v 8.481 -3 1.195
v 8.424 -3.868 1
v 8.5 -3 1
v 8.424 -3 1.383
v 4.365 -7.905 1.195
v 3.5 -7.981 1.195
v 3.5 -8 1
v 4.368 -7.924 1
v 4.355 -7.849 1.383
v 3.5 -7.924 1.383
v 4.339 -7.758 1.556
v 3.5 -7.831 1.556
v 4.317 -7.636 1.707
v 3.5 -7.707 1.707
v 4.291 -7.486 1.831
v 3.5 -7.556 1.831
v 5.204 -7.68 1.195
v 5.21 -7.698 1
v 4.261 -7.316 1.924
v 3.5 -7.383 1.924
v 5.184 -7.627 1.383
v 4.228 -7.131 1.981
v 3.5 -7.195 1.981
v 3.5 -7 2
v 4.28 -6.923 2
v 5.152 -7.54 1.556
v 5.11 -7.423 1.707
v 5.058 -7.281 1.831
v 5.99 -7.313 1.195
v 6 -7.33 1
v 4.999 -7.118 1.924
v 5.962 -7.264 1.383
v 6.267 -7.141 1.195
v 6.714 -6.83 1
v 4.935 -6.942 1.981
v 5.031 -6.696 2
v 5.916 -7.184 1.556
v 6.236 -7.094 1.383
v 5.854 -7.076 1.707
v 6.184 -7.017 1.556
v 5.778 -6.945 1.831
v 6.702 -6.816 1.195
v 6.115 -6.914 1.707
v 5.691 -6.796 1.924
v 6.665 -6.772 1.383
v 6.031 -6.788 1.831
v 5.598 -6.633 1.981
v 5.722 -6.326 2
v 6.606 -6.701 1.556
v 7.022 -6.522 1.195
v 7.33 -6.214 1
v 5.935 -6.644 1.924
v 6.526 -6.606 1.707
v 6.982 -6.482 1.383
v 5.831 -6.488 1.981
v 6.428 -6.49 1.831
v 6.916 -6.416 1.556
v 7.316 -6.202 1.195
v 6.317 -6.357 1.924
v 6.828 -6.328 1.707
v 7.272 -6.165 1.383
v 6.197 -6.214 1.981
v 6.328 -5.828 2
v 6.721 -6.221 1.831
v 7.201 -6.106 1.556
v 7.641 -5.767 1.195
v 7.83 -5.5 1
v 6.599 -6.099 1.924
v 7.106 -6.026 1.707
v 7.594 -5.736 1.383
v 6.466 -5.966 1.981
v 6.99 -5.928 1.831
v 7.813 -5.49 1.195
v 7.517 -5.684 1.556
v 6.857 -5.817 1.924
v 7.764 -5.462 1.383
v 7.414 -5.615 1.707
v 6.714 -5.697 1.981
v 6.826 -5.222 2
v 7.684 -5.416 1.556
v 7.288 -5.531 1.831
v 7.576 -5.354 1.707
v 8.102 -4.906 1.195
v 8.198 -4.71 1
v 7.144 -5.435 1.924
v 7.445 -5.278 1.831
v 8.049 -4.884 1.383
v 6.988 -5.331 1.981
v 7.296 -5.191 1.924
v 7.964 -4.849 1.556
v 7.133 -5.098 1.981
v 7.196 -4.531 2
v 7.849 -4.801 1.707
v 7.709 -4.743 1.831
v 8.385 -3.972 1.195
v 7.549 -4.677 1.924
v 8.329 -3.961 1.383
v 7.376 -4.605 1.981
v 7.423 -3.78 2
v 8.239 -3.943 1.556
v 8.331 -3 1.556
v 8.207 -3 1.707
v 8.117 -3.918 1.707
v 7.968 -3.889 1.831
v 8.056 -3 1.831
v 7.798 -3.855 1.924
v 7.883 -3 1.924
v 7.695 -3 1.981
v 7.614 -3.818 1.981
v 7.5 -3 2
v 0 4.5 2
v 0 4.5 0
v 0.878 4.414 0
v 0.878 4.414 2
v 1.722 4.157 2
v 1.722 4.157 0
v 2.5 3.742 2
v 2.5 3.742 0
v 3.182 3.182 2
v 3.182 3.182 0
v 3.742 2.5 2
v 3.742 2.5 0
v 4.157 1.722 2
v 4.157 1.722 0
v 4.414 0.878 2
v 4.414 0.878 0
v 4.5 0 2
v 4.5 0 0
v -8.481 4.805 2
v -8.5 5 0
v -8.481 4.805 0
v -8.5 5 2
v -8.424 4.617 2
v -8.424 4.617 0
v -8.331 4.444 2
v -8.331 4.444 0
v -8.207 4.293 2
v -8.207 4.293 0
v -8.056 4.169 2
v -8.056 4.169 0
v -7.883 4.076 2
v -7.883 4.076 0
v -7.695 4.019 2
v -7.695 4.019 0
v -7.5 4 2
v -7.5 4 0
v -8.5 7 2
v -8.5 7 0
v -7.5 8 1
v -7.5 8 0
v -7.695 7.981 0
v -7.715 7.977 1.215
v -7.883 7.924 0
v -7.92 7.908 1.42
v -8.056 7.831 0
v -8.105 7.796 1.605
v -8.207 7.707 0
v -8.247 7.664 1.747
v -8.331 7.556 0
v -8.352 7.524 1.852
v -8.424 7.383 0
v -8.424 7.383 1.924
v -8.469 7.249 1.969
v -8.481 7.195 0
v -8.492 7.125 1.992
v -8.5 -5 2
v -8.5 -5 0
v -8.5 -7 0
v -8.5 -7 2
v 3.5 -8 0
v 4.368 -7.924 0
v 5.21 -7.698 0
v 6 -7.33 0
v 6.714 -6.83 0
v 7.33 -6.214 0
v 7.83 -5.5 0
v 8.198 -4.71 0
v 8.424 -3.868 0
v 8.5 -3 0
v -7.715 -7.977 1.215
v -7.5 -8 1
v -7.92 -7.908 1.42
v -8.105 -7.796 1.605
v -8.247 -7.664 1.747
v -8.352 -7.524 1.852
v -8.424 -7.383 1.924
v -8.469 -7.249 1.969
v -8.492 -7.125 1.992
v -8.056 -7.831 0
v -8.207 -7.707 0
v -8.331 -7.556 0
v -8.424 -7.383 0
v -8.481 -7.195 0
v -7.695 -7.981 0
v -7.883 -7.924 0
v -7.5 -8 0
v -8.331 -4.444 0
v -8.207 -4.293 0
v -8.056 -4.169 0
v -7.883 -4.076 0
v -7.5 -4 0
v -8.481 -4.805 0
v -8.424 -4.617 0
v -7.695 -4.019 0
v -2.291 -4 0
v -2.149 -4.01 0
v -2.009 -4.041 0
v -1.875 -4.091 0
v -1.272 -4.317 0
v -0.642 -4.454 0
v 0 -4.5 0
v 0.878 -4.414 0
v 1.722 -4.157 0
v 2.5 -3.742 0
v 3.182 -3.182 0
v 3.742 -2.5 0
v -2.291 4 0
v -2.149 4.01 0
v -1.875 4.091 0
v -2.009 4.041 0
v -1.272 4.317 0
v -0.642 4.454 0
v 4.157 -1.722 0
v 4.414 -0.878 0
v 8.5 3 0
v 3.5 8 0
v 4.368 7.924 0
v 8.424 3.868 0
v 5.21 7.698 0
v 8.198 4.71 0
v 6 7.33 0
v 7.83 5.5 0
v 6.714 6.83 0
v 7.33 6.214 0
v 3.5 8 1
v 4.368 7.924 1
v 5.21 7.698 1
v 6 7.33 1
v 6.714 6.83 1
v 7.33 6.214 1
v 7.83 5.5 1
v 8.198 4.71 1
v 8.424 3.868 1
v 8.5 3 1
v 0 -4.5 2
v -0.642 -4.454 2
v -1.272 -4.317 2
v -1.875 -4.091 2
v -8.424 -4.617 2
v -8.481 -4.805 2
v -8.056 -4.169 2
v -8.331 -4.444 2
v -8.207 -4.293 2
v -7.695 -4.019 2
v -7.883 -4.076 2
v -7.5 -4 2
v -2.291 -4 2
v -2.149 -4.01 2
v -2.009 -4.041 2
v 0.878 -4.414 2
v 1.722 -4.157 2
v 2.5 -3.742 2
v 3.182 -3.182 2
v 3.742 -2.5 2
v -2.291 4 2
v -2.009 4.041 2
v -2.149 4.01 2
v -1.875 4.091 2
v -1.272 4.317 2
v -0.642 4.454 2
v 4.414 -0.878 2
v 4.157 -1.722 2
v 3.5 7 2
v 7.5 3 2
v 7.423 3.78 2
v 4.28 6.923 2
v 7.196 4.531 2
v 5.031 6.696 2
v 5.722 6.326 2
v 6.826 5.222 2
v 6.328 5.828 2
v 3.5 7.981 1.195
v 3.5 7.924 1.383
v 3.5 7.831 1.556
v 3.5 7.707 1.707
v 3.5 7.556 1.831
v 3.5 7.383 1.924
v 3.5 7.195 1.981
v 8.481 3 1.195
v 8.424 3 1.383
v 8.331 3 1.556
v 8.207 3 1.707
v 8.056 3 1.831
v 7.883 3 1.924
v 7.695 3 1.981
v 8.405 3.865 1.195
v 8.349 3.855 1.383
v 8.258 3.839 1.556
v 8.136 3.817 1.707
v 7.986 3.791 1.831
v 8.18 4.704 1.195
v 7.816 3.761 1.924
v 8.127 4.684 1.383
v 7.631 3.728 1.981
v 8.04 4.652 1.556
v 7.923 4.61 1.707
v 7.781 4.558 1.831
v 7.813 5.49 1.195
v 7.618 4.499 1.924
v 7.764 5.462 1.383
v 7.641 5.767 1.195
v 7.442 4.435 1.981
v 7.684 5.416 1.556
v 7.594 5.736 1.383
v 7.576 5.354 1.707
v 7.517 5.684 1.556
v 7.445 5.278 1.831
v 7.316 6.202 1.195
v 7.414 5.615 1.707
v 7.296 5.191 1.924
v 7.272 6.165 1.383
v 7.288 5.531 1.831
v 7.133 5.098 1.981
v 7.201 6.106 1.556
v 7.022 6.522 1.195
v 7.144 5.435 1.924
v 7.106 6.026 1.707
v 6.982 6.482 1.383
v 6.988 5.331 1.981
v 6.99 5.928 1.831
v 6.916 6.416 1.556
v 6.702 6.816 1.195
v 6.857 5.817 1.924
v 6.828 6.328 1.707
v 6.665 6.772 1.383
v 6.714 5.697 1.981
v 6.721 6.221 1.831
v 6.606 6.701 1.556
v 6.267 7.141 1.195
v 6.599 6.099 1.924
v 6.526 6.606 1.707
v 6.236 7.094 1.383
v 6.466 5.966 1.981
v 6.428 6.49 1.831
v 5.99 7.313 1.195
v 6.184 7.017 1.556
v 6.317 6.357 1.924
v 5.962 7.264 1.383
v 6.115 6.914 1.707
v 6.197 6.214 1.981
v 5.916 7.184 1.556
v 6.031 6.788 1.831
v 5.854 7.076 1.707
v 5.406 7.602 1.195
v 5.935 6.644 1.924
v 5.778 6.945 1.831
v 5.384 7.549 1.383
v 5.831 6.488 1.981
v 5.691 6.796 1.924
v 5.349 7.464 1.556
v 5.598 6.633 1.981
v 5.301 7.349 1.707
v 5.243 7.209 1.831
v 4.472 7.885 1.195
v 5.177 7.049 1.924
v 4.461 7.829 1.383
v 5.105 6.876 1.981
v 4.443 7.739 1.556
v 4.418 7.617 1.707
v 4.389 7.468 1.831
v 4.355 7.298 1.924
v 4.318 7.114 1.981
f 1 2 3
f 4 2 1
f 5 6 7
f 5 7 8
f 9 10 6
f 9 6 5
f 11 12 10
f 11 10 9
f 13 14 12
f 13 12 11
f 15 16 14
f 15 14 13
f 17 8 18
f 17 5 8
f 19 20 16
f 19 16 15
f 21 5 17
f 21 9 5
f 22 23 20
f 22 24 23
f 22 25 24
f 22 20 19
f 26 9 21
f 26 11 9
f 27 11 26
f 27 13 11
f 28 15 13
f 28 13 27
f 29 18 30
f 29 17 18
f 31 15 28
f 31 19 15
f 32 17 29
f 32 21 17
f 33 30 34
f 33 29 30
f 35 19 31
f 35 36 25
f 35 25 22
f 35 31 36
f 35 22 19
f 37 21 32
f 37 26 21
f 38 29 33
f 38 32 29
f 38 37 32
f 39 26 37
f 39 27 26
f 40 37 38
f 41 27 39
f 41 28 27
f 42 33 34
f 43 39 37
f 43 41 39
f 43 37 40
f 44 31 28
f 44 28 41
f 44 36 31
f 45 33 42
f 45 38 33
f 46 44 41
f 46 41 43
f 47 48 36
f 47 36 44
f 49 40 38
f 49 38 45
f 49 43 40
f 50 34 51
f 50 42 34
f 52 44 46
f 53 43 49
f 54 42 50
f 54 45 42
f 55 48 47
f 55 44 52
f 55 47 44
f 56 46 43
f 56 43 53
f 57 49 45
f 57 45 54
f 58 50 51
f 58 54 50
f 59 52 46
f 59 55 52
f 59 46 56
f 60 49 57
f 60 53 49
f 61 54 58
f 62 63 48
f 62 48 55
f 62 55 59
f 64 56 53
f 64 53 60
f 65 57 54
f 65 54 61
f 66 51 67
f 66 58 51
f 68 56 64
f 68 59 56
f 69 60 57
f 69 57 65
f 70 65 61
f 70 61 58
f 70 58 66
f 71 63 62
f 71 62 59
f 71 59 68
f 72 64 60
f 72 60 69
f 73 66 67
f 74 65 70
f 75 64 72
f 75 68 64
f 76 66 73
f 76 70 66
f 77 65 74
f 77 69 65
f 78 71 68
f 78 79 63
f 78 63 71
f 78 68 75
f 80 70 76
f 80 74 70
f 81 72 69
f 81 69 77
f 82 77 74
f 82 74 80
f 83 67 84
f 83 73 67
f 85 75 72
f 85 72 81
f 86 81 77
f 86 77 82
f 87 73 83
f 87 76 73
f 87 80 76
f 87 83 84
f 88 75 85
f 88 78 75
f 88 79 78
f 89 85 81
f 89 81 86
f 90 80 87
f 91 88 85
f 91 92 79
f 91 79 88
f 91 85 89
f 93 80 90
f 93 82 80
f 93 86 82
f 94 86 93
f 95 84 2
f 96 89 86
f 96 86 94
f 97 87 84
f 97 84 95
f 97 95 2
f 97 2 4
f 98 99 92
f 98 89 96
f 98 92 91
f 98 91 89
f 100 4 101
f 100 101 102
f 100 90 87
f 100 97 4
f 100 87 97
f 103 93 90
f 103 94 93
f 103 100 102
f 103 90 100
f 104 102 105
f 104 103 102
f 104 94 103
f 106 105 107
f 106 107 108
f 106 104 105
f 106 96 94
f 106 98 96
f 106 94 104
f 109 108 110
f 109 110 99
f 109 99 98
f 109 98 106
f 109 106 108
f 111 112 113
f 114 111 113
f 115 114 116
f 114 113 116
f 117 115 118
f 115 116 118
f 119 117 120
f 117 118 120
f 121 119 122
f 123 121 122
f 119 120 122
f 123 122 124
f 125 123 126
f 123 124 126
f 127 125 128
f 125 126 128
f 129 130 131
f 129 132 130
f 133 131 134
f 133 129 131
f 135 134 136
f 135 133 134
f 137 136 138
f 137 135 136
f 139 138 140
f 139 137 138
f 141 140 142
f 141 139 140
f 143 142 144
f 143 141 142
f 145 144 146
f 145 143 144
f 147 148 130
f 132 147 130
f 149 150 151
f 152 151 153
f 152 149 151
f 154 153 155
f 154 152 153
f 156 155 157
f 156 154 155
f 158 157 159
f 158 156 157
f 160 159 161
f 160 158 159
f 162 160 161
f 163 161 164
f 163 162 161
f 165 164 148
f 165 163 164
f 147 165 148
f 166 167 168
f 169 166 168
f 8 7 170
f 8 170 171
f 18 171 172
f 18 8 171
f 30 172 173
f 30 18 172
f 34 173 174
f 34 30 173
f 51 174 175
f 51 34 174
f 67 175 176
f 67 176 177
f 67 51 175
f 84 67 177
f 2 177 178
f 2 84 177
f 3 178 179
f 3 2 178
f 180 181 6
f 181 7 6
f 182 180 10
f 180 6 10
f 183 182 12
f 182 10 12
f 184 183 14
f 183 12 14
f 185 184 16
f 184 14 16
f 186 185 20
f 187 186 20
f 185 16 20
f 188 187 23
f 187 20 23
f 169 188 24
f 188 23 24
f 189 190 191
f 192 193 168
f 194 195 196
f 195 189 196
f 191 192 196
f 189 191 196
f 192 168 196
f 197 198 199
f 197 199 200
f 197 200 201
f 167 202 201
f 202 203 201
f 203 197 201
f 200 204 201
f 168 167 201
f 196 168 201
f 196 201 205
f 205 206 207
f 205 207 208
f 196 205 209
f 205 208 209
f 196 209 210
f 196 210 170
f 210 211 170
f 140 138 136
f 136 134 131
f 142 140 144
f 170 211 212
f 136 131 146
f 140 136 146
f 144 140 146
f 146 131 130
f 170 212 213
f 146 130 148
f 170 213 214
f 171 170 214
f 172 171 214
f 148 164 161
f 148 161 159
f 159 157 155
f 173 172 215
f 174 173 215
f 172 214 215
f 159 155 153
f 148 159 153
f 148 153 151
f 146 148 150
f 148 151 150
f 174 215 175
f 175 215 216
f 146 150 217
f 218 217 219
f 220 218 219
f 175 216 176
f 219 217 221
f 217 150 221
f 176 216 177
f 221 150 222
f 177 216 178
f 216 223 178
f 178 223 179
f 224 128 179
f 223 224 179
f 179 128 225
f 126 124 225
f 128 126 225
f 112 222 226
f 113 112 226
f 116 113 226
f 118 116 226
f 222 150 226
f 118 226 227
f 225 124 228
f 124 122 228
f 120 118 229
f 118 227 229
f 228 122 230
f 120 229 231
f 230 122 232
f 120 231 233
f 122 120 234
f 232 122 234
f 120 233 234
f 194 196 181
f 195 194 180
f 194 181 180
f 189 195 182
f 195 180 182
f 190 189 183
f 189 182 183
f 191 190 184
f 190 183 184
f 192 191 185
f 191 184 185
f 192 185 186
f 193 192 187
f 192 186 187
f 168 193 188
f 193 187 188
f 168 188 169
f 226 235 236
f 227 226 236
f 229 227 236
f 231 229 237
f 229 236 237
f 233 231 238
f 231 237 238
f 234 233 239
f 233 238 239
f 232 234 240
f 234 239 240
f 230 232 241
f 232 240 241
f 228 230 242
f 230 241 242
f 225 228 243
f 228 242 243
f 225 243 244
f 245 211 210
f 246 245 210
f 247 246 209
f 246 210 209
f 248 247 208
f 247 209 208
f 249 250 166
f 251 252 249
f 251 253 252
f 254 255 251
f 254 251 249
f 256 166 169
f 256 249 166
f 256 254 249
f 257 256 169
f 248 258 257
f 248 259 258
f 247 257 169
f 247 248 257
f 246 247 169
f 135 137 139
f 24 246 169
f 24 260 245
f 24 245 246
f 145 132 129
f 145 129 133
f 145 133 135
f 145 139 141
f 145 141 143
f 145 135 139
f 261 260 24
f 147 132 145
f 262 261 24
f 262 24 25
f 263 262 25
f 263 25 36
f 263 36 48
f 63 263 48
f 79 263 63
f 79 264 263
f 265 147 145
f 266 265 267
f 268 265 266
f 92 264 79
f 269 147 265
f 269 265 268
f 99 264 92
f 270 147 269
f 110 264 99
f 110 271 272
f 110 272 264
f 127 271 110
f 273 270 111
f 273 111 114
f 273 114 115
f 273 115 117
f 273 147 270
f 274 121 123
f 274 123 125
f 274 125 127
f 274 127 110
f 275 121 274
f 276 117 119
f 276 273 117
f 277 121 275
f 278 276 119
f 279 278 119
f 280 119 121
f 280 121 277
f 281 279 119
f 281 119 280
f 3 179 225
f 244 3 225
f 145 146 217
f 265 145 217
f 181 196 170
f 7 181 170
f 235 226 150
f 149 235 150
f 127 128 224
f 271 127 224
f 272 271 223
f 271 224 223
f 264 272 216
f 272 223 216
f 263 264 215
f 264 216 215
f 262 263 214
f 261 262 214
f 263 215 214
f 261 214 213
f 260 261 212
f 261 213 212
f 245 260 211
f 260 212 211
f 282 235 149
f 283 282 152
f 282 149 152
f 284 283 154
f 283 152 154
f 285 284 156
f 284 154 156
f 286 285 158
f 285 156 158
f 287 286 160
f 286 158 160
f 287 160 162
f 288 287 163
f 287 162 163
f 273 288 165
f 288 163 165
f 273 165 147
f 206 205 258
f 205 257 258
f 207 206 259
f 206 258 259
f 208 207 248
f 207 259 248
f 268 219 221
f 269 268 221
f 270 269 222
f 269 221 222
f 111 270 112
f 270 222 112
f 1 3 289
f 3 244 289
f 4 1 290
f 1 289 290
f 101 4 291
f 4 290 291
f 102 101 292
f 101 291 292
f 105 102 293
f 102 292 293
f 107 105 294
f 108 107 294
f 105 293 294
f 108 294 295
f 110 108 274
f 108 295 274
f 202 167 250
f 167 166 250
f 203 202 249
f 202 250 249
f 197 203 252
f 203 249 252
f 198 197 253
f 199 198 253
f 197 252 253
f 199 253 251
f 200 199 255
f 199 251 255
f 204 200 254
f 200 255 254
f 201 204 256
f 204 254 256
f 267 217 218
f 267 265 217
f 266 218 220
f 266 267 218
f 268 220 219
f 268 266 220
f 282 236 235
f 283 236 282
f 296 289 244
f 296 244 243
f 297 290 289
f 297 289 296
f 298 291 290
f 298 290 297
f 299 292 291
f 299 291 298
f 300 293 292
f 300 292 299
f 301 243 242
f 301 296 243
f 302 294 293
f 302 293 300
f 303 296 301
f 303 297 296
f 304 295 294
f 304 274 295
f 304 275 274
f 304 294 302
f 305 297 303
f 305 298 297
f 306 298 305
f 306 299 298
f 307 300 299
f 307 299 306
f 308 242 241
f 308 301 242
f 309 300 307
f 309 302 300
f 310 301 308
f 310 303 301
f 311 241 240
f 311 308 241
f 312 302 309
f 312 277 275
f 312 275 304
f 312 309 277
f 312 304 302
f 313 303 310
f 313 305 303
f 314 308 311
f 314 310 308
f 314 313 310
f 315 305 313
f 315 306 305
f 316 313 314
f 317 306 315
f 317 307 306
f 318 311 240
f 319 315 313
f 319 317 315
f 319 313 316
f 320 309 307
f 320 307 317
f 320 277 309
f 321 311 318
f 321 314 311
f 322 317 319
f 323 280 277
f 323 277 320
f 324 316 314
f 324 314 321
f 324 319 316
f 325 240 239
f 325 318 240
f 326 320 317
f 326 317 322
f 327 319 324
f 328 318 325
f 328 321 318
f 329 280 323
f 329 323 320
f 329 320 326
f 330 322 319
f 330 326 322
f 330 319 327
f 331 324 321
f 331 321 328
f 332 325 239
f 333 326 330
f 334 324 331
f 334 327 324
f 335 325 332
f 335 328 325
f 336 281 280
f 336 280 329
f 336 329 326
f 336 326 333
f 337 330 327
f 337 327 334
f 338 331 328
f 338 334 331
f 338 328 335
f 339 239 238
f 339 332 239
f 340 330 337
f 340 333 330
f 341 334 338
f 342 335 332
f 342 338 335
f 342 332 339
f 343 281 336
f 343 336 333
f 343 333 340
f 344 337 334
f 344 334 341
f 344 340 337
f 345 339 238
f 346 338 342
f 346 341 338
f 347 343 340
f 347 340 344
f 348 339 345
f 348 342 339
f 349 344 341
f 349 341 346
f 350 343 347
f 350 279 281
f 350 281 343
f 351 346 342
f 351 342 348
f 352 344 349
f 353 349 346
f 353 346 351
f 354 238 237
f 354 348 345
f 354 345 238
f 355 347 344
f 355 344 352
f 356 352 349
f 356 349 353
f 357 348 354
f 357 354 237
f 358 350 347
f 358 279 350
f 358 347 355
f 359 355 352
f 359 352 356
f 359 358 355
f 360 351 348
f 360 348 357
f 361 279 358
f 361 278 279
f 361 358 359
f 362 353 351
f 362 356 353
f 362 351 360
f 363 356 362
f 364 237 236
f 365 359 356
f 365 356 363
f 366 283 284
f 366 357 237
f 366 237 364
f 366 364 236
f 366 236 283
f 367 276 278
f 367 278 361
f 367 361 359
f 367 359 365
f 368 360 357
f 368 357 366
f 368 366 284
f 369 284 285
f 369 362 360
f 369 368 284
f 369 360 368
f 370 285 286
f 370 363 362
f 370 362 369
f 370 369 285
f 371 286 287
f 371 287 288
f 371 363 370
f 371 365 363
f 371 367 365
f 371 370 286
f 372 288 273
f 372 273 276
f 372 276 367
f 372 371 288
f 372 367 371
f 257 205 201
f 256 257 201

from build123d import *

# Parameters (mm, degrees)
F1_DEPTH = 2
F2_R     = 5
F3_R     = 1


with BuildPart() as f1:
    # F0 (on Top) → F1 (new body)
    with BuildSketch(Plane.XY):
        with BuildLine():
            Line((8.5, 8), (-8.5, 8))
            Line((-8.5, 8), (-8.5, 4.5))
            Line((-8.5, 4.5), (0, 4.5))
            ThreePointArc((0, 4.5), (3.181981, 3.181981), (4.5, 0))
            ThreePointArc((4.5, 0), (3.181981, -3.181981), (0, -4.5))
            Line((0, -4.5), (-8.5, -4.5))
            Line((-8.5, -4.5), (-8.5, -8))
            Line((-8.5, -8), (8.5, -8))
            Line((8.5, -8), (8.5, 8))
        make_face()
        with BuildLine():
            Line((0, 4.5), (-8.5, 4.5))
            Line((-8.5, 4.5), (-8.5, 4))
            Line((-8.5, 4), (-2.061553, 4))
            ThreePointArc((-2.061553, 4), (-1.06066, 4.373214), (0, 4.5))
        make_face()
        with BuildLine():
            Line((-2.061553, -4), (-8.5, -4))
            Line((-8.5, -4), (-8.5, -4.5))
            Line((-8.5, -4.5), (0, -4.5))
            ThreePointArc((0, -4.5), (-1.06066, -4.373214), (-2.061553, -4))
        make_face()
    extrude(amount=F1_DEPTH)

    # F2
    f2_edges = [f1.edges().sort_by_distance(p)[0] for p in [
        (8.5, 8, 1),
        (8.5, -8, 1),
    ]]
    fillet(f2_edges, radius=F2_R)

    # F3
    f3_edges = [f1.edges().sort_by_distance(p)[0] for p in [
        (-2.061553, -4, 1),
        (-2.061553, 4, 1),
        (-2.5, 8, 2),
        (-8.5, -4, 1),
        (-8.5, -8, 1),
        (-8.5, 4, 1),
        (-8.5, 8, 1),
    ]]
    fillet(f3_edges, radius=F3_R)


solid = f1.part
